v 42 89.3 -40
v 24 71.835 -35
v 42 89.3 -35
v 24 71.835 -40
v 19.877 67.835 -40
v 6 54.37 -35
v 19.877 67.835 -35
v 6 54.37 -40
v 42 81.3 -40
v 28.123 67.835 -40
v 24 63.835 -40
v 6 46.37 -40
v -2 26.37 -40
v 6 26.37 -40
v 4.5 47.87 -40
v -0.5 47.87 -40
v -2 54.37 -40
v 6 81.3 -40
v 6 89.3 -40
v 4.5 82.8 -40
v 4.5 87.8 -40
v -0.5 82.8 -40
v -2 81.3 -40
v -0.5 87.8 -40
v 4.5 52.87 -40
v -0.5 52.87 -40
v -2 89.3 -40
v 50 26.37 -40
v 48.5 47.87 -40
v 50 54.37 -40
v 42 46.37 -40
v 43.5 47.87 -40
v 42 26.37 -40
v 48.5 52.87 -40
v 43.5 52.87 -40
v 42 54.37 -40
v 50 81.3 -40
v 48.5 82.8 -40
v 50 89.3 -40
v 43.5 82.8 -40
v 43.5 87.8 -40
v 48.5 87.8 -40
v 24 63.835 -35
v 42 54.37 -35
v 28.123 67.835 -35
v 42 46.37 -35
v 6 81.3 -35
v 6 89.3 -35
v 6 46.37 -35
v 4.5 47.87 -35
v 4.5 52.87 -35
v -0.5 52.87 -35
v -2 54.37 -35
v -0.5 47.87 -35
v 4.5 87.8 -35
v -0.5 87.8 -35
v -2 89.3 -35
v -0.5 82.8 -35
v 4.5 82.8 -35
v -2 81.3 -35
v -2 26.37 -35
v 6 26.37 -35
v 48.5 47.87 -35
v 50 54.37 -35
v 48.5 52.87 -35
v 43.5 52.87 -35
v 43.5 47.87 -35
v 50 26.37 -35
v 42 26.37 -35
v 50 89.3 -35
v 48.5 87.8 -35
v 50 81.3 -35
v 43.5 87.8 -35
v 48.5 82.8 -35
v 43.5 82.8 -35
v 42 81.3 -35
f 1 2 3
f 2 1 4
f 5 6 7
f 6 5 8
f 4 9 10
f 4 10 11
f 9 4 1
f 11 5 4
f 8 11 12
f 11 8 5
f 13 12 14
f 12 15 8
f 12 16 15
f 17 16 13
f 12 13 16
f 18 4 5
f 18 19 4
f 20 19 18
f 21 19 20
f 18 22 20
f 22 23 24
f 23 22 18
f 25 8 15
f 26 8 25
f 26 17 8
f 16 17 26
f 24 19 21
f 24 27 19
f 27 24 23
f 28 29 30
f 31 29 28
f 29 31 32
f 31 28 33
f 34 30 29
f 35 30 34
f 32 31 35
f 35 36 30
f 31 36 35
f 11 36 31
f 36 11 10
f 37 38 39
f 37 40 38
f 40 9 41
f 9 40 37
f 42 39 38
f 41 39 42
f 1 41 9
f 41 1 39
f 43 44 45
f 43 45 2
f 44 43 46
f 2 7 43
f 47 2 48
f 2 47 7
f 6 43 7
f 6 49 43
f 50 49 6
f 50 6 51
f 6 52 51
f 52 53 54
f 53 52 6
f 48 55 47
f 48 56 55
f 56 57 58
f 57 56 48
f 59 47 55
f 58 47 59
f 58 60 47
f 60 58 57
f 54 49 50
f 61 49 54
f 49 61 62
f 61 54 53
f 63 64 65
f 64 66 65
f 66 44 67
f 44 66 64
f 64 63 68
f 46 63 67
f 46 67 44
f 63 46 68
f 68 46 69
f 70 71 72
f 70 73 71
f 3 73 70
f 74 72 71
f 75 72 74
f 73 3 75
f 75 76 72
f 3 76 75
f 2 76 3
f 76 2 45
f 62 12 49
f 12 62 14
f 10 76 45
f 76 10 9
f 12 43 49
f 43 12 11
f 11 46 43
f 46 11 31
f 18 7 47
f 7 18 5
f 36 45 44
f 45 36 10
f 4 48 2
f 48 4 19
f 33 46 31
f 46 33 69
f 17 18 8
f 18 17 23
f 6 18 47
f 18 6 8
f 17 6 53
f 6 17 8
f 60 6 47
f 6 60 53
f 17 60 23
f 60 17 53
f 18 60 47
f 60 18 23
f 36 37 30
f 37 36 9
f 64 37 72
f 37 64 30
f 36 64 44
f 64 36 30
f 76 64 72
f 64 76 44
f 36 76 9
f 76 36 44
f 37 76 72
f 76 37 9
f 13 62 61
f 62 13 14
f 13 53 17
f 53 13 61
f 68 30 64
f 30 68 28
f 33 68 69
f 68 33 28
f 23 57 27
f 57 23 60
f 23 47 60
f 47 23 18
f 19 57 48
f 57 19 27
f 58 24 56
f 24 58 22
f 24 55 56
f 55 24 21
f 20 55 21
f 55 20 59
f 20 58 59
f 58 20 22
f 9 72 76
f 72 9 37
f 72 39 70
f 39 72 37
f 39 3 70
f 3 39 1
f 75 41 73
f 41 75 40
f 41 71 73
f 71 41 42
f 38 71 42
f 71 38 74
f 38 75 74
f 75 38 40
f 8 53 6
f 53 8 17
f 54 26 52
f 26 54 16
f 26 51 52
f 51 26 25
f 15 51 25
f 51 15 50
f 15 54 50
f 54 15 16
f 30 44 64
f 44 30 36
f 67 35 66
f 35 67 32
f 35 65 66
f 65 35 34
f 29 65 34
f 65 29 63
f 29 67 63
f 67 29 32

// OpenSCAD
// file: ../drawers/drawer-780x470x255.scad
// These are the usable inner dimension of the drawer.
function drawer_inner_depth() = 471; // millimeters
function drawer_inner_width() = 780;
function drawer_inner_front_height() = 255;
function drawer_inner_back_height() = 160;
function drawer_inner_height() = max(drawer_inner_front_height(), drawer_inner_back_height());

function drawer_side_wall_thickness() = 15; // Does not matter in regards to usable space

module drawer_bottom() {
    width = drawer_inner_width() + 2* drawer_side_wall_thickness();
    height = drawer_side_wall_thickness();
    depth = drawer_inner_depth() + 2* drawer_side_wall_thickness();

    // make the innner space of the drawer aligned with coordinates [0,0,0]
    offset_x = -drawer_side_wall_thickness();
    offset_y = -drawer_side_wall_thickness();
    offset_z = -drawer_side_wall_thickness();

    translate([offset_x, offset_y, offset_z]) cube([width, depth, height]);
}

module drawer_front() {
    width = drawer_inner_width() + 2* drawer_side_wall_thickness();
    height = drawer_inner_height();
    depth = drawer_side_wall_thickness();

    offset_x = -drawer_side_wall_thickness();
    offset_y = -drawer_side_wall_thickness();
    offset_z = -drawer_side_wall_thickness();

    handle_width = 160;
    handle_depth = 20;
    handle_height = 20;

    // make the innner space of the drawer aligned with coordinates [0,0,0]
    handle_offset_x = offset_x + width / 2 - handle_width / 2;
    handle_offset_y = offset_y - handle_depth;
    handle_offset_z = offset_z + height / 2 - handle_height / 2;

    union() {
        // front panel
        translate([offset_x, offset_y, offset_z]) cube([width, depth, height]);
        translate([handle_offset_x, handle_offset_y, handle_offset_z]) {
            cube([handle_width, handle_depth, handle_height]);
        }
    }
}

module drawer_side(s = "left") {
    width = drawer_side_wall_thickness();
    height = drawer_inner_height();
    depth = drawer_inner_depth() + 2* drawer_side_wall_thickness();

    offset_y = -drawer_side_wall_thickness();
    offset_z = -drawer_side_wall_thickness();
    if (s == "right") {
        offset_x = drawer_inner_width() + drawer_side_wall_thickness();
        translate([offset_x, offset_y, offset_z]) cube([width, depth, height]);
    } else {
        offset_x = -drawer_side_wall_thickness();
        translate([offset_x, offset_y, offset_z]) cube([width, depth, height]);
    }
}

module drawer_back() {
    width = drawer_inner_width() + 2* drawer_side_wall_thickness();
    height = drawer_inner_back_height();
    depth = drawer_side_wall_thickness();

    offset_x = -drawer_side_wall_thickness();
    offset_y = drawer_inner_depth();
    offset_z = -drawer_side_wall_thickness();

    translate([offset_x, offset_y, offset_z]) cube([width, depth, height]);
}

module drawer() {
    union() {
        drawer_bottom();
        drawer_front();
        drawer_side(s = "left");
        drawer_side(s = "right");
        drawer_back();
    }
}

drawer();
// file: ../jars/jar-rectangular-99x48.scad
function jar_height() = 99; // millimeters
function jar_width() = 48;
function jar_round_edge_radius() = 12;

module jar() {
    linear_extrude(height = jar_height())
    hull() {
        translate([jar_round_edge_radius(), jar_round_edge_radius()]) circle(r = jar_round_edge_radius());
        translate([jar_width() - jar_round_edge_radius(), jar_round_edge_radius()]) circle(r = jar_round_edge_radius());
        translate([jar_width() - jar_round_edge_radius(), jar_width() - jar_round_edge_radius()]) circle(r = jar_round_edge_radius());
        translate([jar_round_edge_radius(), jar_width() - jar_round_edge_radius()]) circle(r = jar_round_edge_radius());
    }
}

jar();
// file: organizer-drawer_780x470x255-jar_99x48.scad
use <../drawers/drawer-780x470x255.scad>;
use <../jars/jar-rectangular-99x48.scad>;

function side_wall_minimum_thickness() = 2;
function foot_wall_minimum_thickness() = side_wall_minimum_thickness();
function organizer_width() = jar_width() + side_wall_minimum_thickness() * 2;
function side_length() = jar_height() + side_wall_minimum_thickness();
function side_height() = jar_round_edge_radius();

function row_attachment_slot_length() = 10;
function row_attachment_slot_width() = 2;
function row_attachment_slot_depth() = 3;
function row_attachment_distance_from_edge() = 2;

module row_attachment_slot() {
    diff_workaround = 0.1;

    offset_x = row_attachment_distance_from_edge();
    offset_y = - diff_workaround;
    offset_z = side_length() / 2 - row_attachment_slot_length() / 2;
    depth = row_attachment_slot_depth() + diff_workaround;

    translate([offset_x, offset_y, offset_z]) cube([row_attachment_slot_width(), depth, row_attachment_slot_length()]);

    other_side_offset_x = organizer_width() - row_attachment_distance_from_edge() - row_attachment_slot_width();
    translate([other_side_offset_x, offset_y, offset_z]) cube([row_attachment_slot_width(), depth, row_attachment_slot_length()]);
}

function row_attachment_pin_wall_thickness() = side_wall_minimum_thickness();
function row_attachment_pin_loose_fit() = 0.05;
function row_attachment_pin_length_loose_fit() = 1.0;
function row_attachment_pin_width() = row_attachment_distance_from_edge() * 4 - row_attachment_pin_loose_fit();

module row_attachment_pin() {
    length = row_attachment_slot_length() - row_attachment_pin_length_loose_fit();
    depth = row_attachment_slot_depth() - row_attachment_pin_loose_fit();
    width = row_attachment_slot_width() - row_attachment_pin_loose_fit();

    linear_extrude(length) {
        union() {
            square([row_attachment_pin_width(), row_attachment_pin_wall_thickness()]);
            translate([0, - depth]) square([width, depth]);
            translate([row_attachment_pin_width() - width, - depth]) square([width, depth]);
        }
    }
}

// aligned with the actual organizer row attachment slot for easier previewing
module row_attachment_pin_aligned() {
    pin_offset_x = organizer_width() - row_attachment_pin_width() / 2 - side_wall_minimum_thickness();
    pin_offset_y = organizer_width() - row_attachment_pin_wall_thickness();
    pin_offset_z = side_length() / 2 - row_attachment_slot_length() / 2 - foot_wall_minimum_thickness();
    translate([pin_offset_x, pin_offset_y, pin_offset_z])
        row_attachment_pin();
}

function vertical_console_slot_depth() = 2;
function vertical_console_slot_diff_workaround() = 0.1;
function vertical_console_shaft_diameter() = 5;
function vertical_console_shaft_distance_from_edge() = 0;
function vertical_console_shaft_minimum_clearance() = 5;
function vertical_console_shaft_cutaway_radius() = vertical_console_shaft_distance_from_edge() + vertical_console_shaft_diameter() + vertical_console_shaft_minimum_clearance();

module vertical_console_cutaway() {
    shaft_offset_y = vertical_console_shaft_distance_from_edge() + vertical_console_shaft_diameter() / 2;
    diff_workaround = 0.1;

    rotate([0, 90, 0])
    linear_extrude(vertical_console_slot_depth() + diff_workaround)
    difference() {
        circle(r = vertical_console_shaft_cutaway_radius());
        translate([0, shaft_offset_y]) circle(d = vertical_console_shaft_diameter());
        translate([0, - vertical_console_shaft_cutaway_radius() - diff_workaround]) square(vertical_console_shaft_cutaway_radius() * 2, center = true);
    }
}

function column_attachment_slot_width() = 5;
function column_attachment_slot_depth() = 3;
function column_attachment_pin_loose_fit() = 0.05;
function vertical_console_cutaway_row_attachment_slont_clearance() = 2;

function vertical_console_row_1_slot_offset_z() = vertical_console_shaft_cutaway_radius() + vertical_console_cutaway_row_attachment_slont_clearance();
function vertical_console_row_2_slot_offset_z() = side_length() / 2 + vertical_console_shaft_cutaway_radius() + row_attachment_slot_length() / 2 + vertical_console_cutaway_row_attachment_slont_clearance();
function vertical_console_side_a_offset_x() = - vertical_console_slot_diff_workaround();
function vertical_console_side_b_offset_x() = organizer_width() - vertical_console_slot_depth();

module organizer_side(ol = 0) {
    diff_workaround = vertical_console_slot_diff_workaround();

    difference() {
        linear_extrude(side_length())
        difference() {
            square([organizer_width(), side_height() + side_wall_minimum_thickness()]);
            translate([jar_round_edge_radius() + side_wall_minimum_thickness(), jar_round_edge_radius() + side_wall_minimum_thickness()])circle(jar_round_edge_radius());
            translate([jar_width() - jar_round_edge_radius() + side_wall_minimum_thickness(), jar_round_edge_radius() + side_wall_minimum_thickness()])circle(jar_round_edge_radius());
            translate([side_wall_minimum_thickness() + jar_round_edge_radius(), side_wall_minimum_thickness()]) square([jar_width() - 2 * jar_round_edge_radius(), side_height()]);
        }

        if (ol > 0) {
            offset_z = side_length() - ol - foot_wall_minimum_thickness();
            translate([- diff_workaround, - diff_workaround, offset_z]) cube([column_attachment_slot_width() + diff_workaround, column_attachment_slot_depth() + diff_workaround, foot_wall_minimum_thickness()]);

            offset_x = organizer_width() - column_attachment_slot_width() + diff_workaround;
            translate([offset_x, - diff_workaround, offset_z]) cube([column_attachment_slot_width() + diff_workaround, column_attachment_slot_depth() + diff_workaround, foot_wall_minimum_thickness()]);
        }

        row_attachment_slot();
        translate([vertical_console_side_a_offset_x(), 0, vertical_console_row_1_slot_offset_z()]) vertical_console_cutaway();
        translate([vertical_console_side_b_offset_x(), 0, vertical_console_row_1_slot_offset_z()]) vertical_console_cutaway();

        translate([vertical_console_side_a_offset_x(), 0, vertical_console_row_2_slot_offset_z()]) vertical_console_cutaway();
        translate([vertical_console_side_b_offset_x(), 0, vertical_console_row_2_slot_offset_z()]) vertical_console_cutaway();
    }
}

module organizer_foot(lf = 0, ol = 0, fp = false) {
    pin_width = column_attachment_slot_width() - column_attachment_pin_loose_fit();
    pin_depth = column_attachment_slot_depth() - column_attachment_pin_loose_fit();
    pin_thickness = foot_wall_minimum_thickness() - column_attachment_pin_loose_fit();

    pin_offset_y = organizer_width() + lf;
    pin_offset_x = organizer_width() - pin_width;
    pin_offset_z = column_attachment_pin_loose_fit() / 2;

    union() {
        cube([organizer_width(), organizer_width() + lf, foot_wall_minimum_thickness()]);
        if (fp) {
            translate([0, pin_offset_y, pin_offset_z]) cube([pin_width, pin_depth, pin_thickness]);
            translate([pin_offset_x, pin_offset_y, pin_offset_z]) cube([pin_width, pin_depth, pin_thickness]);
        }
    }
}

module organizer(
    ol = 0, // overlap - used to determine where the foot of the next organizer will attach to the side of the current one
    lf = 0, // loose fit - distance between two organizers so it is easy to slide in jar into overlapping organizers
    fp = false, // add attachment pins to foot
) {
    translate([jar_width() + side_wall_minimum_thickness(), jar_width() + side_wall_minimum_thickness(), -side_wall_minimum_thickness()])
    rotate([0, 0, 180])
    difference() {
        union() {
            organizer_side(ol);
            organizer_foot(lf = lf, ol = ol, fp = fp);
        }
    }
}

translate([side_wall_minimum_thickness(), foot_wall_minimum_thickness(), organizer_width() - side_wall_minimum_thickness()])
rotate([-90, 0, 0])
organizer(lf = 3, ol = 18, fp = true);
// main file
use <organizer-drawer_780x470x255-jar_99x48-console.scad>;

base_plate();
